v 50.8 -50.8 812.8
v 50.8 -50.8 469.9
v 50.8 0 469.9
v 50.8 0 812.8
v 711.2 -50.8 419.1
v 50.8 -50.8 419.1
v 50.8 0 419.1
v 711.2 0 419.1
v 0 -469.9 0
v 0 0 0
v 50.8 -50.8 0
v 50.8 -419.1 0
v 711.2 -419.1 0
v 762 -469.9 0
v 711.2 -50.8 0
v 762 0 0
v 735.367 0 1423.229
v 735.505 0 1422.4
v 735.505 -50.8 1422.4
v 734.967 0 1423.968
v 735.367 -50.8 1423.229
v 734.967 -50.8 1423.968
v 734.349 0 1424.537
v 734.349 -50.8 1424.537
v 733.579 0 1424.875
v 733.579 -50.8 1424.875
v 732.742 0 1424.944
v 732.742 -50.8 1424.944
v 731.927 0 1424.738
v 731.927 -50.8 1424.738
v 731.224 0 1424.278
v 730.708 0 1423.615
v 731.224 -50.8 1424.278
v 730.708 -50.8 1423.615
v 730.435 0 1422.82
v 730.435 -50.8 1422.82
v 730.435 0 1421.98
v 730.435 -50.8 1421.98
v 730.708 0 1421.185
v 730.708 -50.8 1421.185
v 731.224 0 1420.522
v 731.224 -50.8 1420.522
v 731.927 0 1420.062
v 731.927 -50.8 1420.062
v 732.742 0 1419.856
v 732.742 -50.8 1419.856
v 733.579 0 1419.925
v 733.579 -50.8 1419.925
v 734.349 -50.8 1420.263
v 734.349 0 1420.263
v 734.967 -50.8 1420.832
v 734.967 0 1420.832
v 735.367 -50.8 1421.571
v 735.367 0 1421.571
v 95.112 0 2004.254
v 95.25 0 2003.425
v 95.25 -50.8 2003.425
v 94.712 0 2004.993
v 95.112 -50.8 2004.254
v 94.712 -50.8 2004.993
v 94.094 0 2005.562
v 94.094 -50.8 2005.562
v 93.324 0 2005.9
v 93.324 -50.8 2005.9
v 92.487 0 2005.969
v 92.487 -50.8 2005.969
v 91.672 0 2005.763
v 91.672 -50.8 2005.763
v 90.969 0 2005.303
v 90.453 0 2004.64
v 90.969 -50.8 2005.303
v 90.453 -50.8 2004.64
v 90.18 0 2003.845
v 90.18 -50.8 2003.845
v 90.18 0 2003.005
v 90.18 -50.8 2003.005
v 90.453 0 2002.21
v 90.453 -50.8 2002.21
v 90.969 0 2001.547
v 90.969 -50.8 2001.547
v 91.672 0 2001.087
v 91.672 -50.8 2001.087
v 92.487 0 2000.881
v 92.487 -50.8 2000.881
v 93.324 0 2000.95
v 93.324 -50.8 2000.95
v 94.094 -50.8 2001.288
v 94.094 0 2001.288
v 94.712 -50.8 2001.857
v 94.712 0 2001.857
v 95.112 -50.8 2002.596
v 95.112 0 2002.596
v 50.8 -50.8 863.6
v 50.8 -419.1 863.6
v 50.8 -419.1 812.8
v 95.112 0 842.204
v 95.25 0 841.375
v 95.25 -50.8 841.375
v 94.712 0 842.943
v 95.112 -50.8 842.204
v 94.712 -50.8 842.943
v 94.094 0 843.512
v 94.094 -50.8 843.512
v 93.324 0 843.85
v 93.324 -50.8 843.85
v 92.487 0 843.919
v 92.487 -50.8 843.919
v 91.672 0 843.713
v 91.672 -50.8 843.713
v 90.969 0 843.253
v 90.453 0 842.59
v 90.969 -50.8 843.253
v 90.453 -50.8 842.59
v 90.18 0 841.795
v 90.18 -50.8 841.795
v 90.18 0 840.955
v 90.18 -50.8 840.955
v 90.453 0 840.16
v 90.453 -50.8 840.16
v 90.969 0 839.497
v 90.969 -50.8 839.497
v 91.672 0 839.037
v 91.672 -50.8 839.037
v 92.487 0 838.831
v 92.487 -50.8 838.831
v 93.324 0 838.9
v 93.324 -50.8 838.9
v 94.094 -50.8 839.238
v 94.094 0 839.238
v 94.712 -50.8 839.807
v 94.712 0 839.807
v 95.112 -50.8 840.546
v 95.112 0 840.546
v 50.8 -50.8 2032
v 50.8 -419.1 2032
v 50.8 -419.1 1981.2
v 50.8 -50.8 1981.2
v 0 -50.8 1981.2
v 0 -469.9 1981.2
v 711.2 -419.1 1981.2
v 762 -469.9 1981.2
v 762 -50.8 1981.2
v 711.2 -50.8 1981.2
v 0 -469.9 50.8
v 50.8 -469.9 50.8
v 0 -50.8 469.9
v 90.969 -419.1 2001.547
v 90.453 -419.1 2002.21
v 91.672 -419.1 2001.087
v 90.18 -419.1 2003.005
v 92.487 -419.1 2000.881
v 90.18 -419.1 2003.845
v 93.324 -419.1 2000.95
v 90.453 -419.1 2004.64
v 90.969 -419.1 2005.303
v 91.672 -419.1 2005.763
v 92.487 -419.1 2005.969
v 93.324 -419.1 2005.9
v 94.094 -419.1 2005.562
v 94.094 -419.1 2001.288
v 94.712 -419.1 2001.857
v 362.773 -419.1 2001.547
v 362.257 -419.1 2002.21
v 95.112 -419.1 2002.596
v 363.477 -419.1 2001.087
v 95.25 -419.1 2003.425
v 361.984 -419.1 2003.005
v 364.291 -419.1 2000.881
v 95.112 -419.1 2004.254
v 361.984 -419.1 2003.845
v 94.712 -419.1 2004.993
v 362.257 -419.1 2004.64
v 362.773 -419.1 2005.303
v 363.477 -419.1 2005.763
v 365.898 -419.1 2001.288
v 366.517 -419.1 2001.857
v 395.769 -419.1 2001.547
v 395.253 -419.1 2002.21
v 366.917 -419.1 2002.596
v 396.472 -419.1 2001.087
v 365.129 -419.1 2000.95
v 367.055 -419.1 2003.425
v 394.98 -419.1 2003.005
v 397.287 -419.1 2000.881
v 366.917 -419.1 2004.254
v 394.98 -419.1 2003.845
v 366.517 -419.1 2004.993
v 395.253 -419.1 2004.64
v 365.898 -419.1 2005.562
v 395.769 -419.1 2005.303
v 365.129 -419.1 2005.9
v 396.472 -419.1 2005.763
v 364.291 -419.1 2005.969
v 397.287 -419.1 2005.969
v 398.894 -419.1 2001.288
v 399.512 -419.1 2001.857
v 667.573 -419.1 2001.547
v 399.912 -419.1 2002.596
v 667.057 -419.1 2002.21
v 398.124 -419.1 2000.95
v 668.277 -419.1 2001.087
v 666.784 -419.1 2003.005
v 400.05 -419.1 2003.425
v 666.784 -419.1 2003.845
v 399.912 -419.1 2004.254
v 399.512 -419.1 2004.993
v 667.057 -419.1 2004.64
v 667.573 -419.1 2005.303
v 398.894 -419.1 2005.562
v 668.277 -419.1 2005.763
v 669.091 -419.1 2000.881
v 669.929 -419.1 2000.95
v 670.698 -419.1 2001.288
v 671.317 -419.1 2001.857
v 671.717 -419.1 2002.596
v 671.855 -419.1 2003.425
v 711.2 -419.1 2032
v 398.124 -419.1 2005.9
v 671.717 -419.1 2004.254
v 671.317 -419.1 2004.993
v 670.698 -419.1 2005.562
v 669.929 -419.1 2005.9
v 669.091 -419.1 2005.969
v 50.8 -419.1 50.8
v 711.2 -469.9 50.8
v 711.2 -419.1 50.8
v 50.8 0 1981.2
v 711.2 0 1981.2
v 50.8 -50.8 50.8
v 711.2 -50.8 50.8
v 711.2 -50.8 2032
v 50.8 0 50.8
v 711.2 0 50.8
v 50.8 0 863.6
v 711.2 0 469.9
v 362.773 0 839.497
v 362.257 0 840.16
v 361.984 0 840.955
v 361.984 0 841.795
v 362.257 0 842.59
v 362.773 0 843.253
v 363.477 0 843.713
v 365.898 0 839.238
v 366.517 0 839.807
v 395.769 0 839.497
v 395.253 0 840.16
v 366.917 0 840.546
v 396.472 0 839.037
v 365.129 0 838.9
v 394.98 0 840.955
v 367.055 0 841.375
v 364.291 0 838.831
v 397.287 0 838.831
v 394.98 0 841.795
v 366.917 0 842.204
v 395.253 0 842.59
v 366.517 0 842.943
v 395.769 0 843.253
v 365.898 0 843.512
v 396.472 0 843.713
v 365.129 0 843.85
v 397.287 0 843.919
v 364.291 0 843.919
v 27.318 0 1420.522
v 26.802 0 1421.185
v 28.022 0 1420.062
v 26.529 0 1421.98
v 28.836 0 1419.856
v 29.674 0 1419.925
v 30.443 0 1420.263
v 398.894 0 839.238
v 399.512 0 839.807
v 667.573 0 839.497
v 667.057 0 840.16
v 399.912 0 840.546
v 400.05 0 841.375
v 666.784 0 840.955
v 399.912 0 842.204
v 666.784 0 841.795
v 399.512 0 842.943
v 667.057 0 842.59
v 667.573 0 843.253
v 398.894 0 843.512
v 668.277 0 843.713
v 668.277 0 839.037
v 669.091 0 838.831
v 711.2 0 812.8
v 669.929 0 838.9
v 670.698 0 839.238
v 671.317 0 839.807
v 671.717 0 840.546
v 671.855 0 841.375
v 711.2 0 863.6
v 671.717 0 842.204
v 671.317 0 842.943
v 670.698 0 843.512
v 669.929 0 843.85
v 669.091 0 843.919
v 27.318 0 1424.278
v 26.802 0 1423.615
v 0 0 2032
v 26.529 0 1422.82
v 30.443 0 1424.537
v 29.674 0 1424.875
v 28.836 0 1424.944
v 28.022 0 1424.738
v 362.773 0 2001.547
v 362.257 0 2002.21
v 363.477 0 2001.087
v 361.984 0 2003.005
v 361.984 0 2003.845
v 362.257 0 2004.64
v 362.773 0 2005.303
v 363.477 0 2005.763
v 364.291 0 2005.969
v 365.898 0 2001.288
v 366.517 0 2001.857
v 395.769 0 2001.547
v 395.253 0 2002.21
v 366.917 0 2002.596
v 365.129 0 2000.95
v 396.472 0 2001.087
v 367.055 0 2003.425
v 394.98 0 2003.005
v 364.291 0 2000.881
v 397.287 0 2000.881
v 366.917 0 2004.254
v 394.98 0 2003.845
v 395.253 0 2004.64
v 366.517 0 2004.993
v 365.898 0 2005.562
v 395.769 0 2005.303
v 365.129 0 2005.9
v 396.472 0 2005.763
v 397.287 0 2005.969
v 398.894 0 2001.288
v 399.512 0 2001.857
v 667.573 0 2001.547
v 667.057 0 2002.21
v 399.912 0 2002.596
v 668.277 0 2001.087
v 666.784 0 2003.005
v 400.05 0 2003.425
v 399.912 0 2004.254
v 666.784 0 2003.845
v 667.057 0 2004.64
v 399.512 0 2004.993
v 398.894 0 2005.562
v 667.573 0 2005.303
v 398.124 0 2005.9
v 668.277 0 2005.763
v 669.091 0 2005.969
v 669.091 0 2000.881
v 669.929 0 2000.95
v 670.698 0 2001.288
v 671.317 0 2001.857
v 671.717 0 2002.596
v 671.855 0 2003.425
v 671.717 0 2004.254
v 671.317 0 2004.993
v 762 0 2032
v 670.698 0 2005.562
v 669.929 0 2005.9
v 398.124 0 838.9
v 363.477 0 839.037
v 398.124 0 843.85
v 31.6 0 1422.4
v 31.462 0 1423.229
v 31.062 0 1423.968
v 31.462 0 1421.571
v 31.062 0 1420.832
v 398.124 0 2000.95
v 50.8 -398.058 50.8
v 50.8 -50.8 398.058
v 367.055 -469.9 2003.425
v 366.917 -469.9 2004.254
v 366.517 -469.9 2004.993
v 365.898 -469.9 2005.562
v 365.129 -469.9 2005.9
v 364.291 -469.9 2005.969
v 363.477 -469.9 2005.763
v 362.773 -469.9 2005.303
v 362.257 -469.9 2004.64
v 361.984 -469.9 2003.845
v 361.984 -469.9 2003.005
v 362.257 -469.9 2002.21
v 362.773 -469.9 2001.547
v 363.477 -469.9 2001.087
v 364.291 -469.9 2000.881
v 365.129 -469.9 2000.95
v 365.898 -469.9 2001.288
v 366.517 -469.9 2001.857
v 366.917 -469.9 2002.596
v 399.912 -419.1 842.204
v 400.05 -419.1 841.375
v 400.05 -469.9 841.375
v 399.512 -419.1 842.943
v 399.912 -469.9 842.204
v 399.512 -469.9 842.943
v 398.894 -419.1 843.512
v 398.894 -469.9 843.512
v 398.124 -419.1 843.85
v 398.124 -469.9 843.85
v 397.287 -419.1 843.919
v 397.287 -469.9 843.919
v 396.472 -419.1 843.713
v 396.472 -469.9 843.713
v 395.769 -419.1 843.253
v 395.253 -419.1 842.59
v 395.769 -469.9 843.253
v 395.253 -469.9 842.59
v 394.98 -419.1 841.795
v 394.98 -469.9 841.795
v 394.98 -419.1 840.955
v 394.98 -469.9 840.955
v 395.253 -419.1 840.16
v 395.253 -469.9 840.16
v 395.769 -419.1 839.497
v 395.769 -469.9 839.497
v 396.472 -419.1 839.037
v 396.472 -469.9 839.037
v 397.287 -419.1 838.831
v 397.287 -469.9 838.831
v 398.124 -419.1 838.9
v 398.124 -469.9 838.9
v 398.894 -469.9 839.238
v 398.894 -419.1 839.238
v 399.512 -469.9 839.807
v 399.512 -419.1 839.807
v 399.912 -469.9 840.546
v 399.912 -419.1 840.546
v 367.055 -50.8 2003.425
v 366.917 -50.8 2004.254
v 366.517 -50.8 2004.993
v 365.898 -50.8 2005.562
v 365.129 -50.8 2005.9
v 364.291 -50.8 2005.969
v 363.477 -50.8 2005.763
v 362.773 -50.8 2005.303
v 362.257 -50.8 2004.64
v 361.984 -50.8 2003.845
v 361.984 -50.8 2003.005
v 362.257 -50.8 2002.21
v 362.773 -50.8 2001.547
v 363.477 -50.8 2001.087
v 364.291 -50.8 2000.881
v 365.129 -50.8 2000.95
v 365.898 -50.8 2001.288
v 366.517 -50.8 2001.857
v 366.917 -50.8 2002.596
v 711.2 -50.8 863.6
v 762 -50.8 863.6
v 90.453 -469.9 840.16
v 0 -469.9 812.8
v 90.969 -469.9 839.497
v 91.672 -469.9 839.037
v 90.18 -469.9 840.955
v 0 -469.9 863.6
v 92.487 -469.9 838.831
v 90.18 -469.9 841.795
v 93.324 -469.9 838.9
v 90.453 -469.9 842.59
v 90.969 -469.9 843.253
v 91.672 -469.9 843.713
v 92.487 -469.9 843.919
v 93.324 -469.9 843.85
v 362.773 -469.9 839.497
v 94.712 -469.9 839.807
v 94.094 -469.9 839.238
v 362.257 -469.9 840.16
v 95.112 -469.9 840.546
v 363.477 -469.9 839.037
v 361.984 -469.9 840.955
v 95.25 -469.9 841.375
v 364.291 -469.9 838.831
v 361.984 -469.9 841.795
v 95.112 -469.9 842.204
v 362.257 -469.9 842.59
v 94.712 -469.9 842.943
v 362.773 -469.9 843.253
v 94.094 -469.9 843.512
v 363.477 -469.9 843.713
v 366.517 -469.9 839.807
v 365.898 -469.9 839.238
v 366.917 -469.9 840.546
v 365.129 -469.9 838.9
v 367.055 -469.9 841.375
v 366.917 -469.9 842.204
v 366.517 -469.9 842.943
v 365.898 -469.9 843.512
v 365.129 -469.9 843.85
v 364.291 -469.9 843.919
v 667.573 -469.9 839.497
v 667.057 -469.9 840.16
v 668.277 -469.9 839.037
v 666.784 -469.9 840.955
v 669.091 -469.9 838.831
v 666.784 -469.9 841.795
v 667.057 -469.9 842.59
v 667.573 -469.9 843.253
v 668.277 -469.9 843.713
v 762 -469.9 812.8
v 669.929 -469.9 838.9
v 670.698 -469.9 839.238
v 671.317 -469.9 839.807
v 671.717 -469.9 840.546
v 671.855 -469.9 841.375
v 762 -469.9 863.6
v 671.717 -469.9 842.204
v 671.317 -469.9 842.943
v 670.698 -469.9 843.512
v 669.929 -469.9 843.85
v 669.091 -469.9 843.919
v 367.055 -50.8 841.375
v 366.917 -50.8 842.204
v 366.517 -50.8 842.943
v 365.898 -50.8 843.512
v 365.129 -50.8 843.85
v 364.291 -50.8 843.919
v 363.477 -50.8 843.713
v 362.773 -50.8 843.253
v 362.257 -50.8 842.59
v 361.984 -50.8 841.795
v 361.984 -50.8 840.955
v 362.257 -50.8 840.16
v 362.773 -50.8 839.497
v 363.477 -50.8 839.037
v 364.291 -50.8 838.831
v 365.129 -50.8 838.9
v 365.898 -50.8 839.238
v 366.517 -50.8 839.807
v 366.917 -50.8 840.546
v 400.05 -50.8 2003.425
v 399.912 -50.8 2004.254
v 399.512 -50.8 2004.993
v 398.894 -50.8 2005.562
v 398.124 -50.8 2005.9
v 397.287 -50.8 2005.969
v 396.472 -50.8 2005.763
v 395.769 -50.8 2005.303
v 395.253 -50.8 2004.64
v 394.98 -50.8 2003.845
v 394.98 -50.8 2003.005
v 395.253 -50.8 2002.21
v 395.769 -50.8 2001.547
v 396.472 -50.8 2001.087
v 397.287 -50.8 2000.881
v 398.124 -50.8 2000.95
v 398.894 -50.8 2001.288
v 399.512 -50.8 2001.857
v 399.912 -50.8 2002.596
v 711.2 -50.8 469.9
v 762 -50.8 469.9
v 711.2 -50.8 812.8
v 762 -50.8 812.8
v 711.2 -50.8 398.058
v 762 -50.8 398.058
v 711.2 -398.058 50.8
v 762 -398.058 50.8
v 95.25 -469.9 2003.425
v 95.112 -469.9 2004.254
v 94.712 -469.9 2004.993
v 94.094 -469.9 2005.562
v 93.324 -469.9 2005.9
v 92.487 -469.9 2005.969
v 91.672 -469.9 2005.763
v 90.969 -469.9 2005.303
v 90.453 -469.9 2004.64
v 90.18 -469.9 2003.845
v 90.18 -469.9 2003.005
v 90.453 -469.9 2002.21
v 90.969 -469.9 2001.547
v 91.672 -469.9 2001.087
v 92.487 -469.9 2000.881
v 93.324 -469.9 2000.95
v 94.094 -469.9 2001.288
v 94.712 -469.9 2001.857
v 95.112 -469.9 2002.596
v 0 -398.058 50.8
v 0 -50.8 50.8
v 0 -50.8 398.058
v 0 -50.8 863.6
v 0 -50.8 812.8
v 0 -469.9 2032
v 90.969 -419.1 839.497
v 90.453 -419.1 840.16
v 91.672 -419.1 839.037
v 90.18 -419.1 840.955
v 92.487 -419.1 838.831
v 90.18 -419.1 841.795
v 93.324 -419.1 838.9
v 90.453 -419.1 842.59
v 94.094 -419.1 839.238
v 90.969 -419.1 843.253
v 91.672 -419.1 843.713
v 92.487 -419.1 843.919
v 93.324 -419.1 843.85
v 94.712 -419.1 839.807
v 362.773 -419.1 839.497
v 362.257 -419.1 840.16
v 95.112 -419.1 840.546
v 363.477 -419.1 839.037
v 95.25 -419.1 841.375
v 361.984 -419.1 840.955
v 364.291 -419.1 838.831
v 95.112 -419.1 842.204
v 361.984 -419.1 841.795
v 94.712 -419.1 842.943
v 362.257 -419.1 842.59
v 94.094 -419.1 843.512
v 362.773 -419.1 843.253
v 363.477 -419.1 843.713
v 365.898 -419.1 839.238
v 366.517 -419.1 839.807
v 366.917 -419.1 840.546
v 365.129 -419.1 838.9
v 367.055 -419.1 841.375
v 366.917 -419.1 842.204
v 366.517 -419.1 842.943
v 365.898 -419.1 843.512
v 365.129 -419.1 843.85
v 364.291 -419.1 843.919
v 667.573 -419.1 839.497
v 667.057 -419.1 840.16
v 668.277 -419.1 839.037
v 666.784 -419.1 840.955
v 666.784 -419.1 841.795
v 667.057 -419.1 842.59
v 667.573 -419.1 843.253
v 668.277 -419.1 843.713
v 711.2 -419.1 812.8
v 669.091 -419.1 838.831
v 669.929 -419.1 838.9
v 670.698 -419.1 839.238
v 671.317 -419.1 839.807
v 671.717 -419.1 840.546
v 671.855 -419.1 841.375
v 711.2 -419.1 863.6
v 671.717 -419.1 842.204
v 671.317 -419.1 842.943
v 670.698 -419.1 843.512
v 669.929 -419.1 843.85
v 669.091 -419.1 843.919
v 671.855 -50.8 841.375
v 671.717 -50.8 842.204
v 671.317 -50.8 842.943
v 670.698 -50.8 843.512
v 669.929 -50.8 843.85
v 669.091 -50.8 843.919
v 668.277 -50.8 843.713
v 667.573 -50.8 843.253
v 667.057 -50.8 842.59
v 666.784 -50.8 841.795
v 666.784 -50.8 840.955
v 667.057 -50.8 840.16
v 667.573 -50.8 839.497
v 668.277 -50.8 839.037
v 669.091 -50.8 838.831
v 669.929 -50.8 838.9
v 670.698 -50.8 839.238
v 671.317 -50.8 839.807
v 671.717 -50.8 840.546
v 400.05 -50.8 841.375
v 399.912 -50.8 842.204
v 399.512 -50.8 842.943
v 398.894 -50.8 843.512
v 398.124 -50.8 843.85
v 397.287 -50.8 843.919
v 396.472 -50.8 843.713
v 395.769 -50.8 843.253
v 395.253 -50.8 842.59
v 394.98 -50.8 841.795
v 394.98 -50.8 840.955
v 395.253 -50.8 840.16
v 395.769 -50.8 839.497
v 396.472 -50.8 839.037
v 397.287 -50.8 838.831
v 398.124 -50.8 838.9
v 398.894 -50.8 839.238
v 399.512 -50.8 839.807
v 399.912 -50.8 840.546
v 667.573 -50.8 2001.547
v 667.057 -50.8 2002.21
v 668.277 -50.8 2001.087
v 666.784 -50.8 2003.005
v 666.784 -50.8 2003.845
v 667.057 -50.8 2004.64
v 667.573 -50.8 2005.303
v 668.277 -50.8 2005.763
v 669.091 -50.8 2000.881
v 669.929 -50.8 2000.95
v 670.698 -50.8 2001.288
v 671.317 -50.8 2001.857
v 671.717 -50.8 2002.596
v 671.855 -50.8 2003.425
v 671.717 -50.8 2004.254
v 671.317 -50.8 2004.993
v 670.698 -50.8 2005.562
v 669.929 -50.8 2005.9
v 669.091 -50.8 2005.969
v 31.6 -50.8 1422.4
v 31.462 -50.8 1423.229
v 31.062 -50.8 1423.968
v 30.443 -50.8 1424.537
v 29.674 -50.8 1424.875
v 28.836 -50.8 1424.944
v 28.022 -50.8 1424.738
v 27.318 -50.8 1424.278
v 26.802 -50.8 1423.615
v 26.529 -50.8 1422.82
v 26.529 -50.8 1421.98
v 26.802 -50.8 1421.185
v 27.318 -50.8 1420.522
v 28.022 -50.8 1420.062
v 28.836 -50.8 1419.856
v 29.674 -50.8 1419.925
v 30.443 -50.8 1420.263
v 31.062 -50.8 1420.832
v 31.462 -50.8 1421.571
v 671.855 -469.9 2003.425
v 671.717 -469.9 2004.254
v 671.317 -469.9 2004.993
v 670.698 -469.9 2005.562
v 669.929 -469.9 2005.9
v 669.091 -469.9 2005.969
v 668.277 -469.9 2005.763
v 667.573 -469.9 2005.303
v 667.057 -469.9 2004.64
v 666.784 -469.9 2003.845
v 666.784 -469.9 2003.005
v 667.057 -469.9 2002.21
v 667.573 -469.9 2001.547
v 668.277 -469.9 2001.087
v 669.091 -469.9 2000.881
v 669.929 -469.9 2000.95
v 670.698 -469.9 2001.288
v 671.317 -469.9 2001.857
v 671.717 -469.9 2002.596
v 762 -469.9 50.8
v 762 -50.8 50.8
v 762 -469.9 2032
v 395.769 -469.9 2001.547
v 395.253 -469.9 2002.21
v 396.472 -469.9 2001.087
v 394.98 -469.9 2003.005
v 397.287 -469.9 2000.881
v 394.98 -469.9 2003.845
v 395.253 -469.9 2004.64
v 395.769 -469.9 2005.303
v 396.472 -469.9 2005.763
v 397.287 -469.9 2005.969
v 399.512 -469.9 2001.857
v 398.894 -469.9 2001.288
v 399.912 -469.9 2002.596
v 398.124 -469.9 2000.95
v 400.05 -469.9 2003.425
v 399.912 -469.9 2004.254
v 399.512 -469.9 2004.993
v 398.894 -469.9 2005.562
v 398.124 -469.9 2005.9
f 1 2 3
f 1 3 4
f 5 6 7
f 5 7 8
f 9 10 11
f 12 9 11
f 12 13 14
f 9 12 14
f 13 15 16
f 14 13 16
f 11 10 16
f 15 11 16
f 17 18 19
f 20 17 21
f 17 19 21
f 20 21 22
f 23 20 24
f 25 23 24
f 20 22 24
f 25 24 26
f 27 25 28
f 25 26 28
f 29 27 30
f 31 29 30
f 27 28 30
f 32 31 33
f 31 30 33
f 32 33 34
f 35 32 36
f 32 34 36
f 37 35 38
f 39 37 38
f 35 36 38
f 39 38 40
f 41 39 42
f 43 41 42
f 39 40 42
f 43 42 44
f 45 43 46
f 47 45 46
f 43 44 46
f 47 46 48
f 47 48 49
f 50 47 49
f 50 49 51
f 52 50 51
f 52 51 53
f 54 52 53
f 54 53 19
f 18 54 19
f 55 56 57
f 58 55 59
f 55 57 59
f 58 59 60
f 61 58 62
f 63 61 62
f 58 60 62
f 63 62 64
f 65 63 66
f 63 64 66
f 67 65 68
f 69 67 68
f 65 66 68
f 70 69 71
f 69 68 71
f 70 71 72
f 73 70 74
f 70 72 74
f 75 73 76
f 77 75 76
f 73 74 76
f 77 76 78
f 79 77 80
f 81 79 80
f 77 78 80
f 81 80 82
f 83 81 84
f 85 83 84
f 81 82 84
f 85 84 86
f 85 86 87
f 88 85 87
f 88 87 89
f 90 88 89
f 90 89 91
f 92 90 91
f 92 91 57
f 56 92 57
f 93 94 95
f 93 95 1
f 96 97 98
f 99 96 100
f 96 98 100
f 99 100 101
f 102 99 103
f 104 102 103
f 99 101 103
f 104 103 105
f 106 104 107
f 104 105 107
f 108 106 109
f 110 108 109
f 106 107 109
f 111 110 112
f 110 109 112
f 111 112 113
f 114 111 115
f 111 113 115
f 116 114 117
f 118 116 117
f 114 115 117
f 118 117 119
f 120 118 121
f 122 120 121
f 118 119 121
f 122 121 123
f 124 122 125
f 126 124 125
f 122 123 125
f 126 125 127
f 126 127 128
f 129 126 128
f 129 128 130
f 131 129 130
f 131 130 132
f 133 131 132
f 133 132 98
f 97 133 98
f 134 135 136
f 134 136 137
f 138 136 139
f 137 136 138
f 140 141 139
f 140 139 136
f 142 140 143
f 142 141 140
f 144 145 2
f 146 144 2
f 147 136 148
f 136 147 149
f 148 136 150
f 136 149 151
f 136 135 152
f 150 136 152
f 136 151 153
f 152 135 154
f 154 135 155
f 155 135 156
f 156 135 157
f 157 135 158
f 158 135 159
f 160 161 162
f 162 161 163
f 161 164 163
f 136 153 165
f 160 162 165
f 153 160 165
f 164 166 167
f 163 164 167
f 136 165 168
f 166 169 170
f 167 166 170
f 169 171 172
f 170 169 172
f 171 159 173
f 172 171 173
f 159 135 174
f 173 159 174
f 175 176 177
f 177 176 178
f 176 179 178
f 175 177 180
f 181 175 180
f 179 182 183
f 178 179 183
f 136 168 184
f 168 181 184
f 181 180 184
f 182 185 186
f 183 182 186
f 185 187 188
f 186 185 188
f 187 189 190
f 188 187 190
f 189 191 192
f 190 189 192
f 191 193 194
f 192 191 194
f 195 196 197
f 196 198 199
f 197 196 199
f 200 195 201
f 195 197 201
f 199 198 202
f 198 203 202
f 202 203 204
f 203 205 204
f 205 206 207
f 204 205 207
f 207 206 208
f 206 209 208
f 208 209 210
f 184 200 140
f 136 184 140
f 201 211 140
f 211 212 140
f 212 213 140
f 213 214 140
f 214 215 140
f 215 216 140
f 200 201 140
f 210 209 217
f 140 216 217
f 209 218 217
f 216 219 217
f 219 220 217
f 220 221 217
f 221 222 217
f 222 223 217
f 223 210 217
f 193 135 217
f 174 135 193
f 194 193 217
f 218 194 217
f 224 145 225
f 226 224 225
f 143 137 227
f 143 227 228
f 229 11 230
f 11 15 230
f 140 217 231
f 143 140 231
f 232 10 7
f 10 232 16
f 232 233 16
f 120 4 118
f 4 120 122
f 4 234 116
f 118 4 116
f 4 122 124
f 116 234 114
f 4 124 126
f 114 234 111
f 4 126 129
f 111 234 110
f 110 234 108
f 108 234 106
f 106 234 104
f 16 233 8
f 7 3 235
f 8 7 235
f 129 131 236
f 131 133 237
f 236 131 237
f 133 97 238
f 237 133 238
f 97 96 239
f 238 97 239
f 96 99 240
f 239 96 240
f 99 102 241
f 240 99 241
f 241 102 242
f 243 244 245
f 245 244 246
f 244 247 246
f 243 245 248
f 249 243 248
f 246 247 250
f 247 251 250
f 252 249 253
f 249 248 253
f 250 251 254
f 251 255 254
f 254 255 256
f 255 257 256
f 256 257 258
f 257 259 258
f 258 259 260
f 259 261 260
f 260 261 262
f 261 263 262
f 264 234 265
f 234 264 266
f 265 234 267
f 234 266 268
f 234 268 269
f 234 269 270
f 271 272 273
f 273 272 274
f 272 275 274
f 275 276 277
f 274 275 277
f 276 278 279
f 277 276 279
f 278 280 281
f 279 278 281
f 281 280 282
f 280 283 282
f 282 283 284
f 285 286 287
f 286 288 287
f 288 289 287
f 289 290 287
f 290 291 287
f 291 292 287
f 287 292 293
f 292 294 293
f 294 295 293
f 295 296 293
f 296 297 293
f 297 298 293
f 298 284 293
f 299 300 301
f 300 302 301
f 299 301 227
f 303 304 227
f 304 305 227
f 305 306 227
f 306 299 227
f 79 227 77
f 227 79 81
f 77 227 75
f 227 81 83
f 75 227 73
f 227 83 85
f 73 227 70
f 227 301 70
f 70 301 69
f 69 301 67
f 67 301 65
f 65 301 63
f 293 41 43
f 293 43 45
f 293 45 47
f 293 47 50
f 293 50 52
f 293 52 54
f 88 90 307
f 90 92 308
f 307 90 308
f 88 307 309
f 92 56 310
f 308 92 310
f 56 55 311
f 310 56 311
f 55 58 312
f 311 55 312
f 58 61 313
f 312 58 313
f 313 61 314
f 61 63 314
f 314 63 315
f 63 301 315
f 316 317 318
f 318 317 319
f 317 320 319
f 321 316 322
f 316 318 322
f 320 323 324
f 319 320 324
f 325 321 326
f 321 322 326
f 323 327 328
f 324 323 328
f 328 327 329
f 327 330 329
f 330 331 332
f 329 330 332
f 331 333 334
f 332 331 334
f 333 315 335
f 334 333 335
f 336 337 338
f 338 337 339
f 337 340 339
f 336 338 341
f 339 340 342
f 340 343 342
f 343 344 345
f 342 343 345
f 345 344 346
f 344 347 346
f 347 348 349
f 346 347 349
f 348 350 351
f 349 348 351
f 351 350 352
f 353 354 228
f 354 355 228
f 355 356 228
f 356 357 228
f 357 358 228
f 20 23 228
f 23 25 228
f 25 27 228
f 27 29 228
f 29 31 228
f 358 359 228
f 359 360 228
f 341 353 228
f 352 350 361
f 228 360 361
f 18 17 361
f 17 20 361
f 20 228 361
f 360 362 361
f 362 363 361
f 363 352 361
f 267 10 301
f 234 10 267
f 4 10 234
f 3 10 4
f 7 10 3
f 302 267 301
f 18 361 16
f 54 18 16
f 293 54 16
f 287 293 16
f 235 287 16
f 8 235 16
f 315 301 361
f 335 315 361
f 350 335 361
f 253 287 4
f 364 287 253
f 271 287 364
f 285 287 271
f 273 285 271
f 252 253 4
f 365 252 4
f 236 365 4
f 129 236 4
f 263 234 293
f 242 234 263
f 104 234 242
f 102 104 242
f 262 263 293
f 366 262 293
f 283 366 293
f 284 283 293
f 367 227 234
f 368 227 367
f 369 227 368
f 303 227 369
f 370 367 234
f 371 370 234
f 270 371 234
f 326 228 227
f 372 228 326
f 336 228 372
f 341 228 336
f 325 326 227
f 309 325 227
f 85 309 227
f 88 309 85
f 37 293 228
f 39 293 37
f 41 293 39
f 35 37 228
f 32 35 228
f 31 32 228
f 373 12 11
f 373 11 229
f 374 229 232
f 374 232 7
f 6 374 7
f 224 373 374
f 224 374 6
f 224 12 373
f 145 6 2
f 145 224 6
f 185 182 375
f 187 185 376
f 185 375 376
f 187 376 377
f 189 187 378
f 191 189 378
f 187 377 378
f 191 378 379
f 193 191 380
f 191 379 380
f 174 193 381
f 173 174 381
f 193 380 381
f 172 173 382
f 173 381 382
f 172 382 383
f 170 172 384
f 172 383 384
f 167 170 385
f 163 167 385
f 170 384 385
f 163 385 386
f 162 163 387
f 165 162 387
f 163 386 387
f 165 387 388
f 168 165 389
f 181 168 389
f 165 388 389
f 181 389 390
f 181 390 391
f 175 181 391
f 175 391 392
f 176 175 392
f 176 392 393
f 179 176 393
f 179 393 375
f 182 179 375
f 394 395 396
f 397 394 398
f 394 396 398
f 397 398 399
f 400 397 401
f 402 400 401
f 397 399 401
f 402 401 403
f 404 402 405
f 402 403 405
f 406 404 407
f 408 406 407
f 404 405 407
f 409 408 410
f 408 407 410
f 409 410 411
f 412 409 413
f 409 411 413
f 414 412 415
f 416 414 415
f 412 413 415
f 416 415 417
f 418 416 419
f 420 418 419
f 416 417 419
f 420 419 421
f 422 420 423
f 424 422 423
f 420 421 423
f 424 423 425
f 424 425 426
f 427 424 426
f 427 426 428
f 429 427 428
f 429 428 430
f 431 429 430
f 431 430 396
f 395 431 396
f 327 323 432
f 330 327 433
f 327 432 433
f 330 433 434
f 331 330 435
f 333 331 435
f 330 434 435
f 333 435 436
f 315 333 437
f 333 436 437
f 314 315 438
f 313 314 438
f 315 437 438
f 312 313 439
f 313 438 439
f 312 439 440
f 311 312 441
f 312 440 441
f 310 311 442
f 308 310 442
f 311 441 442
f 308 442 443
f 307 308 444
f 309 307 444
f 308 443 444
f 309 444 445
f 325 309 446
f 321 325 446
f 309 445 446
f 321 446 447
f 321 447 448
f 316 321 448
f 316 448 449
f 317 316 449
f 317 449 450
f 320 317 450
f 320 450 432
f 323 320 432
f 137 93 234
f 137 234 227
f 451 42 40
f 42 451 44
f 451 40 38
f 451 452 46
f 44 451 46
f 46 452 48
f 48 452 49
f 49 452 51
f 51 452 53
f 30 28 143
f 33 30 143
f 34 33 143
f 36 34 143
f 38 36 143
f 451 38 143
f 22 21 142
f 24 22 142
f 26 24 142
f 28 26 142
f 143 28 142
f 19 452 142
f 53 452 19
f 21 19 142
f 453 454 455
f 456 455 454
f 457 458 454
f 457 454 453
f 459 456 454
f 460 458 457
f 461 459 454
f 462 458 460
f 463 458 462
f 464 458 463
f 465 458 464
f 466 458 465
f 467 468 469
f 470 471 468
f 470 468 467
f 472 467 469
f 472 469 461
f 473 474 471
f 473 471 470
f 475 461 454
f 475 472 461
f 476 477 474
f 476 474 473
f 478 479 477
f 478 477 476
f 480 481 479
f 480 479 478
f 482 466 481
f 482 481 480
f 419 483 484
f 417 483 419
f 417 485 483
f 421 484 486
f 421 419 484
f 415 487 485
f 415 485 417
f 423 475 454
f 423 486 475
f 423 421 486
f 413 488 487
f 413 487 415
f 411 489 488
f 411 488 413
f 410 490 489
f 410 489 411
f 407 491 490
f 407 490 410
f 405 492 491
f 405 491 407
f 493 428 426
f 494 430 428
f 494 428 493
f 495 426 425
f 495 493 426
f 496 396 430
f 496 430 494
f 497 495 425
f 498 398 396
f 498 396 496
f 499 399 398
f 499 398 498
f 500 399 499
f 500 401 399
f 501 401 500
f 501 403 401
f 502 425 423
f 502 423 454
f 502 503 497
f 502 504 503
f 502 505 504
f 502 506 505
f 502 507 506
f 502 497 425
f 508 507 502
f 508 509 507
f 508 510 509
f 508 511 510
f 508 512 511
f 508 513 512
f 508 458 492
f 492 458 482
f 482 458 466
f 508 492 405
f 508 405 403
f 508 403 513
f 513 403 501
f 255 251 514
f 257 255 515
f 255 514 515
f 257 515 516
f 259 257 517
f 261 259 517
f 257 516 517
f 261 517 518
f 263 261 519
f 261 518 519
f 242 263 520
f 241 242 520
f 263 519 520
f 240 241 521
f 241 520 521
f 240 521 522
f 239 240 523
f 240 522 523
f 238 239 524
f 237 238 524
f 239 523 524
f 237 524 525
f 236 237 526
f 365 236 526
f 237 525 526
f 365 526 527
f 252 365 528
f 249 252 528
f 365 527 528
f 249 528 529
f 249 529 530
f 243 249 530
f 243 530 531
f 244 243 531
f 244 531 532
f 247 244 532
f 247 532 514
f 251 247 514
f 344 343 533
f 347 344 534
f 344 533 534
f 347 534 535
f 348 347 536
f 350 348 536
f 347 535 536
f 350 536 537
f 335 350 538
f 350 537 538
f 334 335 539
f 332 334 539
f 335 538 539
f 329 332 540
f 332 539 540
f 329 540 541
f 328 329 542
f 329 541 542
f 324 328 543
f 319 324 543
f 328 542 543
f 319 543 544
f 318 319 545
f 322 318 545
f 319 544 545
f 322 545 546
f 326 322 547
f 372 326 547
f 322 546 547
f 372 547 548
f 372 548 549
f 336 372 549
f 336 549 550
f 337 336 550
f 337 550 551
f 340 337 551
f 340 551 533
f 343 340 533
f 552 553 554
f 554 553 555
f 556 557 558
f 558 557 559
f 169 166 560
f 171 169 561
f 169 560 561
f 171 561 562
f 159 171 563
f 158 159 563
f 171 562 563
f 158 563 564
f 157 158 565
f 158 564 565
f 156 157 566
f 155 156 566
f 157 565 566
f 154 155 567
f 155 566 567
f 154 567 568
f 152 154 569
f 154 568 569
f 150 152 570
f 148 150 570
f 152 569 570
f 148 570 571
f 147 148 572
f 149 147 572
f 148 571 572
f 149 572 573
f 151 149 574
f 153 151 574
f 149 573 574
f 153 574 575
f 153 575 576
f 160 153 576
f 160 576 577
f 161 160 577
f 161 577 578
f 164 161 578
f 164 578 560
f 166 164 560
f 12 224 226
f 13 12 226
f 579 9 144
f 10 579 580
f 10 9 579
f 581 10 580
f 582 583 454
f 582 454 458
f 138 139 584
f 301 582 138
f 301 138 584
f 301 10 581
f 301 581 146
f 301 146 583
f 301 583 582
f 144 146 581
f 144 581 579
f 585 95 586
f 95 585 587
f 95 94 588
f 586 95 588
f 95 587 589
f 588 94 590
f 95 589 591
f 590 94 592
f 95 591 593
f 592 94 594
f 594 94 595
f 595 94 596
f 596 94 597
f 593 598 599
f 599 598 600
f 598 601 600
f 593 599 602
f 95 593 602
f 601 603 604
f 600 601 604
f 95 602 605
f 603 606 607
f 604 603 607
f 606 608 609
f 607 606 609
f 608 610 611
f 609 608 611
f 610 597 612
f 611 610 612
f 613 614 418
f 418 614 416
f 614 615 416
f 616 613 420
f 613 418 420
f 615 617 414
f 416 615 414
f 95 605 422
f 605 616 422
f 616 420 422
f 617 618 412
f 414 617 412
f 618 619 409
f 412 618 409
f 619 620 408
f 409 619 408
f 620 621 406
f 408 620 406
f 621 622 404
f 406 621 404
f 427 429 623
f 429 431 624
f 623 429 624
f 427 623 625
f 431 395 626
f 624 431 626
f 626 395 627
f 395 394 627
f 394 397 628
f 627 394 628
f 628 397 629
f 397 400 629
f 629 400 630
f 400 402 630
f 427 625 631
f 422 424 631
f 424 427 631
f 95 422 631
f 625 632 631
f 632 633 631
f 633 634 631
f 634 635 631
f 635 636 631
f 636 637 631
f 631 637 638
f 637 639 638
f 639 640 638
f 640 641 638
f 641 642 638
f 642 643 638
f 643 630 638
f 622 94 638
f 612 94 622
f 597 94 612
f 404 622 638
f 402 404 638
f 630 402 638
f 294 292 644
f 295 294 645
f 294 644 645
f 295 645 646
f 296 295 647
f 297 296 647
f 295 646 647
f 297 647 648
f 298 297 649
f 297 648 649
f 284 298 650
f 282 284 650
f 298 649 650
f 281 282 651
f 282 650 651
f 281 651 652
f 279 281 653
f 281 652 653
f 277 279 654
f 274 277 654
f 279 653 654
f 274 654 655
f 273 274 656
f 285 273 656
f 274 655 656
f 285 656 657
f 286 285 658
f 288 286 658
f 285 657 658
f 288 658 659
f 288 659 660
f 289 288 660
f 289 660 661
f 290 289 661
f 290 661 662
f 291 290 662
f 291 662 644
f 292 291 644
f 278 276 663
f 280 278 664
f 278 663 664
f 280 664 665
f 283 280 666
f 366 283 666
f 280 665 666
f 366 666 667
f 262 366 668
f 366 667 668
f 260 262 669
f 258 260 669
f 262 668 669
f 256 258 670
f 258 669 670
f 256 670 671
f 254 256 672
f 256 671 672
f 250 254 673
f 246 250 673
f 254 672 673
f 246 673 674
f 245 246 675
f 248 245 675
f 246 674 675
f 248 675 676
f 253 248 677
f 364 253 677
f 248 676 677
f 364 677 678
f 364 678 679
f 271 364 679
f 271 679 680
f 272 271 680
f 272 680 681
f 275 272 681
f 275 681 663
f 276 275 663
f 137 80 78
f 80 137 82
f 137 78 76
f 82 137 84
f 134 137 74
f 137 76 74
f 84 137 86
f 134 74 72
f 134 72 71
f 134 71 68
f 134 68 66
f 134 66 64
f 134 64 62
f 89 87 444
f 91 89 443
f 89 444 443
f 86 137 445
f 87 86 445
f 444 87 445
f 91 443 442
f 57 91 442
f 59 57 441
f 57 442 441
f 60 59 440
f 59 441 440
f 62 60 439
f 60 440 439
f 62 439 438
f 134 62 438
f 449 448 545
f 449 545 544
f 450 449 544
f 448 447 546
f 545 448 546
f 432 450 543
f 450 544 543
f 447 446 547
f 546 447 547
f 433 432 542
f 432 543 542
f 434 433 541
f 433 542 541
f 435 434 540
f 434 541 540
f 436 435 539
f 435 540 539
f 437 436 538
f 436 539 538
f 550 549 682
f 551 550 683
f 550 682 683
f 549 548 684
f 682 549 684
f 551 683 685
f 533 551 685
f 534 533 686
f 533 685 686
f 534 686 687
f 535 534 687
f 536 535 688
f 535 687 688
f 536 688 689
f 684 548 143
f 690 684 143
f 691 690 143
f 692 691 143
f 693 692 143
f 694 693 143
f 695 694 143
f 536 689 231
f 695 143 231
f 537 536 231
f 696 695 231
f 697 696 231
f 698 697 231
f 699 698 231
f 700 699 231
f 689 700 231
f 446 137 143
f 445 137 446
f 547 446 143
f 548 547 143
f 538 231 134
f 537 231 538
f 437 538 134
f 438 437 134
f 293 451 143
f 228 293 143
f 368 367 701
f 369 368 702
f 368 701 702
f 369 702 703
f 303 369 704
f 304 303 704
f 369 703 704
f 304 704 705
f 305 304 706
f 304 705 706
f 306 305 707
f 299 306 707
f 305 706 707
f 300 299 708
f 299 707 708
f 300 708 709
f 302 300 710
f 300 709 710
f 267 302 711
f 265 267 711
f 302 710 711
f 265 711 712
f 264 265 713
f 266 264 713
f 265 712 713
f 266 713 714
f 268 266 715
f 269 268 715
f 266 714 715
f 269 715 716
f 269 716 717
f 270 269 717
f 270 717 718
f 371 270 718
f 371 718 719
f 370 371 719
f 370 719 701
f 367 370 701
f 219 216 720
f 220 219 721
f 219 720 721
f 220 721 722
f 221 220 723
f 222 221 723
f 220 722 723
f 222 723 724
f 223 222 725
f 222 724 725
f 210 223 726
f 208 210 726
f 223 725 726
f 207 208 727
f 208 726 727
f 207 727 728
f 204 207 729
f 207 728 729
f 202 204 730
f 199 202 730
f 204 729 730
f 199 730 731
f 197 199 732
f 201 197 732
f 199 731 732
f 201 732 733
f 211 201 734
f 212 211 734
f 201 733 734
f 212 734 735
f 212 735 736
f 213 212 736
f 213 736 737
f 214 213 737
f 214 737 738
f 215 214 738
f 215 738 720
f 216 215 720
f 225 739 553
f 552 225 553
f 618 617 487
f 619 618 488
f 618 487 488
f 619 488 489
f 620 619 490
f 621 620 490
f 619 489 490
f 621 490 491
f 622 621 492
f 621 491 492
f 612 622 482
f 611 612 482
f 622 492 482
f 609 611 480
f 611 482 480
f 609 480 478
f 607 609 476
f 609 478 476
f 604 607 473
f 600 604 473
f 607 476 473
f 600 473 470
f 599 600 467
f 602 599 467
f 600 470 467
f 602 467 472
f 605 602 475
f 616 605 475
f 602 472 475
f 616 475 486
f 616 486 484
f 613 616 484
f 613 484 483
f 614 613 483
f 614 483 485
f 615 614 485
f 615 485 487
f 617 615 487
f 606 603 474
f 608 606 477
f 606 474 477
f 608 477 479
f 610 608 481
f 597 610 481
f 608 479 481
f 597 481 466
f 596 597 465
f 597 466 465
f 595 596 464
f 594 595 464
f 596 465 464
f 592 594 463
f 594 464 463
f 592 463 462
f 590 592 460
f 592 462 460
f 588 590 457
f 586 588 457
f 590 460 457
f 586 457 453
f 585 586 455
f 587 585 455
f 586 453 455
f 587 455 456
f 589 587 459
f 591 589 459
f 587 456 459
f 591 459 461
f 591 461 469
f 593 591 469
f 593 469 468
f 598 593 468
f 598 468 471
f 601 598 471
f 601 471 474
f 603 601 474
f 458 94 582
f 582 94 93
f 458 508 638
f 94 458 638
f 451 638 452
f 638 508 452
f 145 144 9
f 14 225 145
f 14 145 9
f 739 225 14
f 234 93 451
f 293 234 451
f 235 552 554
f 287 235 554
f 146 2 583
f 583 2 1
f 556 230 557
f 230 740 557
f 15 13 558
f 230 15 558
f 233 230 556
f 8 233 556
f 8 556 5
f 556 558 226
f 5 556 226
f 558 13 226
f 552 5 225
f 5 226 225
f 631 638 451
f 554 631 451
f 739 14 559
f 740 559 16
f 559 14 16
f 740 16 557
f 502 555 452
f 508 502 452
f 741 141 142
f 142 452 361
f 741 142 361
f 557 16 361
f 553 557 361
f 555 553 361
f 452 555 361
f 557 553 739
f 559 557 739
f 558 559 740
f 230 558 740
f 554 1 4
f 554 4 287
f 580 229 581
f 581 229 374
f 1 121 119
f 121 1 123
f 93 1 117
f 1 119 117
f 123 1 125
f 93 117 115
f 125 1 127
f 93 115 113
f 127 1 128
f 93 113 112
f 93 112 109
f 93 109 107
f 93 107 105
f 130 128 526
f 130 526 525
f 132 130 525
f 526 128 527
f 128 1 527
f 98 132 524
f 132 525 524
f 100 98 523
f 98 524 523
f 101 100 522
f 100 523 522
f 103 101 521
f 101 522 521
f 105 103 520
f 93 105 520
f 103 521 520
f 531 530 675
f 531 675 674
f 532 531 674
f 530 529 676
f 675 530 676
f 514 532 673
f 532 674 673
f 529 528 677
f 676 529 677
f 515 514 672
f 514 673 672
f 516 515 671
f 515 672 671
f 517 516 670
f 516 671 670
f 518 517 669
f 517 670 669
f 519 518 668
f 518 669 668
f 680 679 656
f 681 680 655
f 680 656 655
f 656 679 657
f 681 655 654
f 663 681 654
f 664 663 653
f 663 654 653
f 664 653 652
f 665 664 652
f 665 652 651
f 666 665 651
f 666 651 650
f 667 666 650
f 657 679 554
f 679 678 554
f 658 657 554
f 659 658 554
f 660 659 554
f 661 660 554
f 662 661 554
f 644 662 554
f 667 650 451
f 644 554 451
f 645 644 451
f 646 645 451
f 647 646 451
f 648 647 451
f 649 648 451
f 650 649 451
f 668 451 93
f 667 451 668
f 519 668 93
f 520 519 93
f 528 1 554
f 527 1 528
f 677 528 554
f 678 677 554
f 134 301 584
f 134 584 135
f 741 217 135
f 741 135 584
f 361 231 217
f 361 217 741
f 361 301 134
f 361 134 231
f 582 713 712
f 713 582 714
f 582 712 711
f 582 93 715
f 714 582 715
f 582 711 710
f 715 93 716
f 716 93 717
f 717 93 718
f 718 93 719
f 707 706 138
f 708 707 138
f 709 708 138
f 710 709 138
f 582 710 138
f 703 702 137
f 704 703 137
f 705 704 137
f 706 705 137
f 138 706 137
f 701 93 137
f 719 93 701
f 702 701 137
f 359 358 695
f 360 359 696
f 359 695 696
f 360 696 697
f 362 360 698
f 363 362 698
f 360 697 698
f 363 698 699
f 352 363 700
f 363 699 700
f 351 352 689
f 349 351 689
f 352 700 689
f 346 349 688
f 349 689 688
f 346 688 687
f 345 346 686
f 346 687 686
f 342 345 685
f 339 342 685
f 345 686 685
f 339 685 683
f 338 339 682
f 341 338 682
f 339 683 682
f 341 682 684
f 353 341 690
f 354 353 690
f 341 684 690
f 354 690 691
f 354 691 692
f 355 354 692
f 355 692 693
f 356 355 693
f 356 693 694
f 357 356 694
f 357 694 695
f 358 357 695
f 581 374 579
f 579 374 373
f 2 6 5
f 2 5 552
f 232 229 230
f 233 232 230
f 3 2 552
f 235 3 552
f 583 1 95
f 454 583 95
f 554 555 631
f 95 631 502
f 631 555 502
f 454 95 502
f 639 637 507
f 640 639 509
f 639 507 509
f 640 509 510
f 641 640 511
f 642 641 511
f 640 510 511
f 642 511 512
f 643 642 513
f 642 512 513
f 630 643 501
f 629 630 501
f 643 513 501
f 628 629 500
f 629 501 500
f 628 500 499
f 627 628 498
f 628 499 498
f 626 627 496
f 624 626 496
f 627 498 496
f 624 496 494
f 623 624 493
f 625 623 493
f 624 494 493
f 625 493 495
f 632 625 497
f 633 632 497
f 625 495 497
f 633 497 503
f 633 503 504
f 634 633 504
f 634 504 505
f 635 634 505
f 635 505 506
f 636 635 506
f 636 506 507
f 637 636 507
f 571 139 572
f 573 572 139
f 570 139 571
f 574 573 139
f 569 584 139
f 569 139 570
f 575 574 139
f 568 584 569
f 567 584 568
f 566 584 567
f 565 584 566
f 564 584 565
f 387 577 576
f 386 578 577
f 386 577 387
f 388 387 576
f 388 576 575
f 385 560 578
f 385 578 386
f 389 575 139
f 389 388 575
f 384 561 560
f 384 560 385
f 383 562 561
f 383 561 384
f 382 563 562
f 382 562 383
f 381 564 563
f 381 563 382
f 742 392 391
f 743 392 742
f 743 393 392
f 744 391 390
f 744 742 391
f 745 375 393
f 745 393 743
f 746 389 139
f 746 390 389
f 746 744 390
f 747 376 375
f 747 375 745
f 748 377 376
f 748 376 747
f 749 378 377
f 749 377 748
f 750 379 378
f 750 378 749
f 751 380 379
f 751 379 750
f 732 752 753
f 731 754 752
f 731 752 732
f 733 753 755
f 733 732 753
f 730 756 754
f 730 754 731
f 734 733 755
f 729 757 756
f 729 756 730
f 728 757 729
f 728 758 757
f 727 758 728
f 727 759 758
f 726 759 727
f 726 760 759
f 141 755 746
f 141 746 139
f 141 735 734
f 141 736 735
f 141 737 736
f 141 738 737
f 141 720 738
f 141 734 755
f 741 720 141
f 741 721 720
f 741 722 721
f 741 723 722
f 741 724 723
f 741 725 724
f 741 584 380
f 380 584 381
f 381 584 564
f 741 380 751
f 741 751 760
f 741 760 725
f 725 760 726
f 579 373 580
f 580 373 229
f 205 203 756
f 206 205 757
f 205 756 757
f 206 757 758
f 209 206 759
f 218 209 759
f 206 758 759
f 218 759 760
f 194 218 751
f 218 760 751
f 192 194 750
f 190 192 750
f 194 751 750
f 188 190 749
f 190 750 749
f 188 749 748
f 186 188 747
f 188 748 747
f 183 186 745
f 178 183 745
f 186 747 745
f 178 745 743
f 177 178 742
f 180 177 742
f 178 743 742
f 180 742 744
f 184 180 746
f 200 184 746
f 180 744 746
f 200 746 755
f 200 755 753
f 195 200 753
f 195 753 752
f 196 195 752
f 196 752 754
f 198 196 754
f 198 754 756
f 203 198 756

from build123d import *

# Parameters (mm, degrees)
F0_W     = 762
F0_H     = 2032
F1_DEPTH = 469.9
F2_W     = 419.1
F2_H     = 1117.6
F3_DEPTH = 762
F4_W     = 660.4
F4_H     = 368.3
F5_DEPTH = 2133.6
F6_W     = 660.4
F6_H     = 1117.6
F6_H_2   = 342.9
F6_H_3   = 368.3
F7_DEPTH = 50.801
F8_W     = 660.4
F8_H     = 50.8
F9_DEPTH = 50.8
F11_D    = 5.1054


with BuildPart() as f1:
    # F0 (on Front) → F1 (new body)
    with BuildSketch(Plane.XZ):
        with Locations((381, 1016)):
            Rectangle(F0_W, F0_H)
    extrude(amount=F1_DEPTH)

    # F2 (on face) → F3 (cut)
    with BuildSketch(Plane.YZ.offset(762)):
        with Locations((-260.35, 1422.4)):
            Rectangle(F2_W, F2_H)
        Polygon((-50.8, 50.8), (-50.8, 398.0579510314), (-398.0579510314, 50.8), align=None)
        Polygon((-50.8, 812.8), (-469.9, 812.8), (-469.9, 50.8), (-50.8, 469.9), align=None)
    extrude(amount=-F3_DEPTH, mode=Mode.SUBTRACT)

    # F4 (on face) → F5 (cut)
    with BuildSketch(Plane.XY.offset(2032)):
        with Locations((381, -234.95)):
            Rectangle(F4_W, F4_H)
    extrude(amount=-F5_DEPTH, mode=Mode.SUBTRACT)

    # F6 (on face) → F7 (cut, through all)
    with BuildSketch(Plane.XZ.offset(50.8)):
        with Locations((381, 1422.4)):
            Rectangle(F6_W, F6_H)
        with Locations((381, 641.35)):
            Rectangle(F6_W, F6_H_2)
        with Locations((381, 234.95)):
            Rectangle(F6_W, F6_H_3)
    extrude(amount=-F7_DEPTH, mode=Mode.SUBTRACT)

    # F8 (on face) → F9 (cut)
    with BuildSketch(Plane.XZ.offset(469.9)):
        with Locations((381, 76.2)):
            Rectangle(F8_W, F8_H)
    extrude(amount=-F9_DEPTH, mode=Mode.SUBTRACT)

    # F11 (through all)
    with Locations(Plane(origin=(0, 0, 0), x_dir=(-1, 0, 0), z_dir=(0, 1, 0))):
        with Locations((-397.4977839421, 2003.425), (-364.5022160579, 2003.425), (-92.6977839421, 2003.425), (-29.047275902, 1422.4), (-732.952724098, 1422.4), (-669.3022160579, 841.375), (-397.4977839421, 841.375), (-364.5022160579, 841.375), (-92.6977839421, 841.375), (-669.3022160579, 2003.425)):
            Hole(F11_D / 2)


solid = f1.part
